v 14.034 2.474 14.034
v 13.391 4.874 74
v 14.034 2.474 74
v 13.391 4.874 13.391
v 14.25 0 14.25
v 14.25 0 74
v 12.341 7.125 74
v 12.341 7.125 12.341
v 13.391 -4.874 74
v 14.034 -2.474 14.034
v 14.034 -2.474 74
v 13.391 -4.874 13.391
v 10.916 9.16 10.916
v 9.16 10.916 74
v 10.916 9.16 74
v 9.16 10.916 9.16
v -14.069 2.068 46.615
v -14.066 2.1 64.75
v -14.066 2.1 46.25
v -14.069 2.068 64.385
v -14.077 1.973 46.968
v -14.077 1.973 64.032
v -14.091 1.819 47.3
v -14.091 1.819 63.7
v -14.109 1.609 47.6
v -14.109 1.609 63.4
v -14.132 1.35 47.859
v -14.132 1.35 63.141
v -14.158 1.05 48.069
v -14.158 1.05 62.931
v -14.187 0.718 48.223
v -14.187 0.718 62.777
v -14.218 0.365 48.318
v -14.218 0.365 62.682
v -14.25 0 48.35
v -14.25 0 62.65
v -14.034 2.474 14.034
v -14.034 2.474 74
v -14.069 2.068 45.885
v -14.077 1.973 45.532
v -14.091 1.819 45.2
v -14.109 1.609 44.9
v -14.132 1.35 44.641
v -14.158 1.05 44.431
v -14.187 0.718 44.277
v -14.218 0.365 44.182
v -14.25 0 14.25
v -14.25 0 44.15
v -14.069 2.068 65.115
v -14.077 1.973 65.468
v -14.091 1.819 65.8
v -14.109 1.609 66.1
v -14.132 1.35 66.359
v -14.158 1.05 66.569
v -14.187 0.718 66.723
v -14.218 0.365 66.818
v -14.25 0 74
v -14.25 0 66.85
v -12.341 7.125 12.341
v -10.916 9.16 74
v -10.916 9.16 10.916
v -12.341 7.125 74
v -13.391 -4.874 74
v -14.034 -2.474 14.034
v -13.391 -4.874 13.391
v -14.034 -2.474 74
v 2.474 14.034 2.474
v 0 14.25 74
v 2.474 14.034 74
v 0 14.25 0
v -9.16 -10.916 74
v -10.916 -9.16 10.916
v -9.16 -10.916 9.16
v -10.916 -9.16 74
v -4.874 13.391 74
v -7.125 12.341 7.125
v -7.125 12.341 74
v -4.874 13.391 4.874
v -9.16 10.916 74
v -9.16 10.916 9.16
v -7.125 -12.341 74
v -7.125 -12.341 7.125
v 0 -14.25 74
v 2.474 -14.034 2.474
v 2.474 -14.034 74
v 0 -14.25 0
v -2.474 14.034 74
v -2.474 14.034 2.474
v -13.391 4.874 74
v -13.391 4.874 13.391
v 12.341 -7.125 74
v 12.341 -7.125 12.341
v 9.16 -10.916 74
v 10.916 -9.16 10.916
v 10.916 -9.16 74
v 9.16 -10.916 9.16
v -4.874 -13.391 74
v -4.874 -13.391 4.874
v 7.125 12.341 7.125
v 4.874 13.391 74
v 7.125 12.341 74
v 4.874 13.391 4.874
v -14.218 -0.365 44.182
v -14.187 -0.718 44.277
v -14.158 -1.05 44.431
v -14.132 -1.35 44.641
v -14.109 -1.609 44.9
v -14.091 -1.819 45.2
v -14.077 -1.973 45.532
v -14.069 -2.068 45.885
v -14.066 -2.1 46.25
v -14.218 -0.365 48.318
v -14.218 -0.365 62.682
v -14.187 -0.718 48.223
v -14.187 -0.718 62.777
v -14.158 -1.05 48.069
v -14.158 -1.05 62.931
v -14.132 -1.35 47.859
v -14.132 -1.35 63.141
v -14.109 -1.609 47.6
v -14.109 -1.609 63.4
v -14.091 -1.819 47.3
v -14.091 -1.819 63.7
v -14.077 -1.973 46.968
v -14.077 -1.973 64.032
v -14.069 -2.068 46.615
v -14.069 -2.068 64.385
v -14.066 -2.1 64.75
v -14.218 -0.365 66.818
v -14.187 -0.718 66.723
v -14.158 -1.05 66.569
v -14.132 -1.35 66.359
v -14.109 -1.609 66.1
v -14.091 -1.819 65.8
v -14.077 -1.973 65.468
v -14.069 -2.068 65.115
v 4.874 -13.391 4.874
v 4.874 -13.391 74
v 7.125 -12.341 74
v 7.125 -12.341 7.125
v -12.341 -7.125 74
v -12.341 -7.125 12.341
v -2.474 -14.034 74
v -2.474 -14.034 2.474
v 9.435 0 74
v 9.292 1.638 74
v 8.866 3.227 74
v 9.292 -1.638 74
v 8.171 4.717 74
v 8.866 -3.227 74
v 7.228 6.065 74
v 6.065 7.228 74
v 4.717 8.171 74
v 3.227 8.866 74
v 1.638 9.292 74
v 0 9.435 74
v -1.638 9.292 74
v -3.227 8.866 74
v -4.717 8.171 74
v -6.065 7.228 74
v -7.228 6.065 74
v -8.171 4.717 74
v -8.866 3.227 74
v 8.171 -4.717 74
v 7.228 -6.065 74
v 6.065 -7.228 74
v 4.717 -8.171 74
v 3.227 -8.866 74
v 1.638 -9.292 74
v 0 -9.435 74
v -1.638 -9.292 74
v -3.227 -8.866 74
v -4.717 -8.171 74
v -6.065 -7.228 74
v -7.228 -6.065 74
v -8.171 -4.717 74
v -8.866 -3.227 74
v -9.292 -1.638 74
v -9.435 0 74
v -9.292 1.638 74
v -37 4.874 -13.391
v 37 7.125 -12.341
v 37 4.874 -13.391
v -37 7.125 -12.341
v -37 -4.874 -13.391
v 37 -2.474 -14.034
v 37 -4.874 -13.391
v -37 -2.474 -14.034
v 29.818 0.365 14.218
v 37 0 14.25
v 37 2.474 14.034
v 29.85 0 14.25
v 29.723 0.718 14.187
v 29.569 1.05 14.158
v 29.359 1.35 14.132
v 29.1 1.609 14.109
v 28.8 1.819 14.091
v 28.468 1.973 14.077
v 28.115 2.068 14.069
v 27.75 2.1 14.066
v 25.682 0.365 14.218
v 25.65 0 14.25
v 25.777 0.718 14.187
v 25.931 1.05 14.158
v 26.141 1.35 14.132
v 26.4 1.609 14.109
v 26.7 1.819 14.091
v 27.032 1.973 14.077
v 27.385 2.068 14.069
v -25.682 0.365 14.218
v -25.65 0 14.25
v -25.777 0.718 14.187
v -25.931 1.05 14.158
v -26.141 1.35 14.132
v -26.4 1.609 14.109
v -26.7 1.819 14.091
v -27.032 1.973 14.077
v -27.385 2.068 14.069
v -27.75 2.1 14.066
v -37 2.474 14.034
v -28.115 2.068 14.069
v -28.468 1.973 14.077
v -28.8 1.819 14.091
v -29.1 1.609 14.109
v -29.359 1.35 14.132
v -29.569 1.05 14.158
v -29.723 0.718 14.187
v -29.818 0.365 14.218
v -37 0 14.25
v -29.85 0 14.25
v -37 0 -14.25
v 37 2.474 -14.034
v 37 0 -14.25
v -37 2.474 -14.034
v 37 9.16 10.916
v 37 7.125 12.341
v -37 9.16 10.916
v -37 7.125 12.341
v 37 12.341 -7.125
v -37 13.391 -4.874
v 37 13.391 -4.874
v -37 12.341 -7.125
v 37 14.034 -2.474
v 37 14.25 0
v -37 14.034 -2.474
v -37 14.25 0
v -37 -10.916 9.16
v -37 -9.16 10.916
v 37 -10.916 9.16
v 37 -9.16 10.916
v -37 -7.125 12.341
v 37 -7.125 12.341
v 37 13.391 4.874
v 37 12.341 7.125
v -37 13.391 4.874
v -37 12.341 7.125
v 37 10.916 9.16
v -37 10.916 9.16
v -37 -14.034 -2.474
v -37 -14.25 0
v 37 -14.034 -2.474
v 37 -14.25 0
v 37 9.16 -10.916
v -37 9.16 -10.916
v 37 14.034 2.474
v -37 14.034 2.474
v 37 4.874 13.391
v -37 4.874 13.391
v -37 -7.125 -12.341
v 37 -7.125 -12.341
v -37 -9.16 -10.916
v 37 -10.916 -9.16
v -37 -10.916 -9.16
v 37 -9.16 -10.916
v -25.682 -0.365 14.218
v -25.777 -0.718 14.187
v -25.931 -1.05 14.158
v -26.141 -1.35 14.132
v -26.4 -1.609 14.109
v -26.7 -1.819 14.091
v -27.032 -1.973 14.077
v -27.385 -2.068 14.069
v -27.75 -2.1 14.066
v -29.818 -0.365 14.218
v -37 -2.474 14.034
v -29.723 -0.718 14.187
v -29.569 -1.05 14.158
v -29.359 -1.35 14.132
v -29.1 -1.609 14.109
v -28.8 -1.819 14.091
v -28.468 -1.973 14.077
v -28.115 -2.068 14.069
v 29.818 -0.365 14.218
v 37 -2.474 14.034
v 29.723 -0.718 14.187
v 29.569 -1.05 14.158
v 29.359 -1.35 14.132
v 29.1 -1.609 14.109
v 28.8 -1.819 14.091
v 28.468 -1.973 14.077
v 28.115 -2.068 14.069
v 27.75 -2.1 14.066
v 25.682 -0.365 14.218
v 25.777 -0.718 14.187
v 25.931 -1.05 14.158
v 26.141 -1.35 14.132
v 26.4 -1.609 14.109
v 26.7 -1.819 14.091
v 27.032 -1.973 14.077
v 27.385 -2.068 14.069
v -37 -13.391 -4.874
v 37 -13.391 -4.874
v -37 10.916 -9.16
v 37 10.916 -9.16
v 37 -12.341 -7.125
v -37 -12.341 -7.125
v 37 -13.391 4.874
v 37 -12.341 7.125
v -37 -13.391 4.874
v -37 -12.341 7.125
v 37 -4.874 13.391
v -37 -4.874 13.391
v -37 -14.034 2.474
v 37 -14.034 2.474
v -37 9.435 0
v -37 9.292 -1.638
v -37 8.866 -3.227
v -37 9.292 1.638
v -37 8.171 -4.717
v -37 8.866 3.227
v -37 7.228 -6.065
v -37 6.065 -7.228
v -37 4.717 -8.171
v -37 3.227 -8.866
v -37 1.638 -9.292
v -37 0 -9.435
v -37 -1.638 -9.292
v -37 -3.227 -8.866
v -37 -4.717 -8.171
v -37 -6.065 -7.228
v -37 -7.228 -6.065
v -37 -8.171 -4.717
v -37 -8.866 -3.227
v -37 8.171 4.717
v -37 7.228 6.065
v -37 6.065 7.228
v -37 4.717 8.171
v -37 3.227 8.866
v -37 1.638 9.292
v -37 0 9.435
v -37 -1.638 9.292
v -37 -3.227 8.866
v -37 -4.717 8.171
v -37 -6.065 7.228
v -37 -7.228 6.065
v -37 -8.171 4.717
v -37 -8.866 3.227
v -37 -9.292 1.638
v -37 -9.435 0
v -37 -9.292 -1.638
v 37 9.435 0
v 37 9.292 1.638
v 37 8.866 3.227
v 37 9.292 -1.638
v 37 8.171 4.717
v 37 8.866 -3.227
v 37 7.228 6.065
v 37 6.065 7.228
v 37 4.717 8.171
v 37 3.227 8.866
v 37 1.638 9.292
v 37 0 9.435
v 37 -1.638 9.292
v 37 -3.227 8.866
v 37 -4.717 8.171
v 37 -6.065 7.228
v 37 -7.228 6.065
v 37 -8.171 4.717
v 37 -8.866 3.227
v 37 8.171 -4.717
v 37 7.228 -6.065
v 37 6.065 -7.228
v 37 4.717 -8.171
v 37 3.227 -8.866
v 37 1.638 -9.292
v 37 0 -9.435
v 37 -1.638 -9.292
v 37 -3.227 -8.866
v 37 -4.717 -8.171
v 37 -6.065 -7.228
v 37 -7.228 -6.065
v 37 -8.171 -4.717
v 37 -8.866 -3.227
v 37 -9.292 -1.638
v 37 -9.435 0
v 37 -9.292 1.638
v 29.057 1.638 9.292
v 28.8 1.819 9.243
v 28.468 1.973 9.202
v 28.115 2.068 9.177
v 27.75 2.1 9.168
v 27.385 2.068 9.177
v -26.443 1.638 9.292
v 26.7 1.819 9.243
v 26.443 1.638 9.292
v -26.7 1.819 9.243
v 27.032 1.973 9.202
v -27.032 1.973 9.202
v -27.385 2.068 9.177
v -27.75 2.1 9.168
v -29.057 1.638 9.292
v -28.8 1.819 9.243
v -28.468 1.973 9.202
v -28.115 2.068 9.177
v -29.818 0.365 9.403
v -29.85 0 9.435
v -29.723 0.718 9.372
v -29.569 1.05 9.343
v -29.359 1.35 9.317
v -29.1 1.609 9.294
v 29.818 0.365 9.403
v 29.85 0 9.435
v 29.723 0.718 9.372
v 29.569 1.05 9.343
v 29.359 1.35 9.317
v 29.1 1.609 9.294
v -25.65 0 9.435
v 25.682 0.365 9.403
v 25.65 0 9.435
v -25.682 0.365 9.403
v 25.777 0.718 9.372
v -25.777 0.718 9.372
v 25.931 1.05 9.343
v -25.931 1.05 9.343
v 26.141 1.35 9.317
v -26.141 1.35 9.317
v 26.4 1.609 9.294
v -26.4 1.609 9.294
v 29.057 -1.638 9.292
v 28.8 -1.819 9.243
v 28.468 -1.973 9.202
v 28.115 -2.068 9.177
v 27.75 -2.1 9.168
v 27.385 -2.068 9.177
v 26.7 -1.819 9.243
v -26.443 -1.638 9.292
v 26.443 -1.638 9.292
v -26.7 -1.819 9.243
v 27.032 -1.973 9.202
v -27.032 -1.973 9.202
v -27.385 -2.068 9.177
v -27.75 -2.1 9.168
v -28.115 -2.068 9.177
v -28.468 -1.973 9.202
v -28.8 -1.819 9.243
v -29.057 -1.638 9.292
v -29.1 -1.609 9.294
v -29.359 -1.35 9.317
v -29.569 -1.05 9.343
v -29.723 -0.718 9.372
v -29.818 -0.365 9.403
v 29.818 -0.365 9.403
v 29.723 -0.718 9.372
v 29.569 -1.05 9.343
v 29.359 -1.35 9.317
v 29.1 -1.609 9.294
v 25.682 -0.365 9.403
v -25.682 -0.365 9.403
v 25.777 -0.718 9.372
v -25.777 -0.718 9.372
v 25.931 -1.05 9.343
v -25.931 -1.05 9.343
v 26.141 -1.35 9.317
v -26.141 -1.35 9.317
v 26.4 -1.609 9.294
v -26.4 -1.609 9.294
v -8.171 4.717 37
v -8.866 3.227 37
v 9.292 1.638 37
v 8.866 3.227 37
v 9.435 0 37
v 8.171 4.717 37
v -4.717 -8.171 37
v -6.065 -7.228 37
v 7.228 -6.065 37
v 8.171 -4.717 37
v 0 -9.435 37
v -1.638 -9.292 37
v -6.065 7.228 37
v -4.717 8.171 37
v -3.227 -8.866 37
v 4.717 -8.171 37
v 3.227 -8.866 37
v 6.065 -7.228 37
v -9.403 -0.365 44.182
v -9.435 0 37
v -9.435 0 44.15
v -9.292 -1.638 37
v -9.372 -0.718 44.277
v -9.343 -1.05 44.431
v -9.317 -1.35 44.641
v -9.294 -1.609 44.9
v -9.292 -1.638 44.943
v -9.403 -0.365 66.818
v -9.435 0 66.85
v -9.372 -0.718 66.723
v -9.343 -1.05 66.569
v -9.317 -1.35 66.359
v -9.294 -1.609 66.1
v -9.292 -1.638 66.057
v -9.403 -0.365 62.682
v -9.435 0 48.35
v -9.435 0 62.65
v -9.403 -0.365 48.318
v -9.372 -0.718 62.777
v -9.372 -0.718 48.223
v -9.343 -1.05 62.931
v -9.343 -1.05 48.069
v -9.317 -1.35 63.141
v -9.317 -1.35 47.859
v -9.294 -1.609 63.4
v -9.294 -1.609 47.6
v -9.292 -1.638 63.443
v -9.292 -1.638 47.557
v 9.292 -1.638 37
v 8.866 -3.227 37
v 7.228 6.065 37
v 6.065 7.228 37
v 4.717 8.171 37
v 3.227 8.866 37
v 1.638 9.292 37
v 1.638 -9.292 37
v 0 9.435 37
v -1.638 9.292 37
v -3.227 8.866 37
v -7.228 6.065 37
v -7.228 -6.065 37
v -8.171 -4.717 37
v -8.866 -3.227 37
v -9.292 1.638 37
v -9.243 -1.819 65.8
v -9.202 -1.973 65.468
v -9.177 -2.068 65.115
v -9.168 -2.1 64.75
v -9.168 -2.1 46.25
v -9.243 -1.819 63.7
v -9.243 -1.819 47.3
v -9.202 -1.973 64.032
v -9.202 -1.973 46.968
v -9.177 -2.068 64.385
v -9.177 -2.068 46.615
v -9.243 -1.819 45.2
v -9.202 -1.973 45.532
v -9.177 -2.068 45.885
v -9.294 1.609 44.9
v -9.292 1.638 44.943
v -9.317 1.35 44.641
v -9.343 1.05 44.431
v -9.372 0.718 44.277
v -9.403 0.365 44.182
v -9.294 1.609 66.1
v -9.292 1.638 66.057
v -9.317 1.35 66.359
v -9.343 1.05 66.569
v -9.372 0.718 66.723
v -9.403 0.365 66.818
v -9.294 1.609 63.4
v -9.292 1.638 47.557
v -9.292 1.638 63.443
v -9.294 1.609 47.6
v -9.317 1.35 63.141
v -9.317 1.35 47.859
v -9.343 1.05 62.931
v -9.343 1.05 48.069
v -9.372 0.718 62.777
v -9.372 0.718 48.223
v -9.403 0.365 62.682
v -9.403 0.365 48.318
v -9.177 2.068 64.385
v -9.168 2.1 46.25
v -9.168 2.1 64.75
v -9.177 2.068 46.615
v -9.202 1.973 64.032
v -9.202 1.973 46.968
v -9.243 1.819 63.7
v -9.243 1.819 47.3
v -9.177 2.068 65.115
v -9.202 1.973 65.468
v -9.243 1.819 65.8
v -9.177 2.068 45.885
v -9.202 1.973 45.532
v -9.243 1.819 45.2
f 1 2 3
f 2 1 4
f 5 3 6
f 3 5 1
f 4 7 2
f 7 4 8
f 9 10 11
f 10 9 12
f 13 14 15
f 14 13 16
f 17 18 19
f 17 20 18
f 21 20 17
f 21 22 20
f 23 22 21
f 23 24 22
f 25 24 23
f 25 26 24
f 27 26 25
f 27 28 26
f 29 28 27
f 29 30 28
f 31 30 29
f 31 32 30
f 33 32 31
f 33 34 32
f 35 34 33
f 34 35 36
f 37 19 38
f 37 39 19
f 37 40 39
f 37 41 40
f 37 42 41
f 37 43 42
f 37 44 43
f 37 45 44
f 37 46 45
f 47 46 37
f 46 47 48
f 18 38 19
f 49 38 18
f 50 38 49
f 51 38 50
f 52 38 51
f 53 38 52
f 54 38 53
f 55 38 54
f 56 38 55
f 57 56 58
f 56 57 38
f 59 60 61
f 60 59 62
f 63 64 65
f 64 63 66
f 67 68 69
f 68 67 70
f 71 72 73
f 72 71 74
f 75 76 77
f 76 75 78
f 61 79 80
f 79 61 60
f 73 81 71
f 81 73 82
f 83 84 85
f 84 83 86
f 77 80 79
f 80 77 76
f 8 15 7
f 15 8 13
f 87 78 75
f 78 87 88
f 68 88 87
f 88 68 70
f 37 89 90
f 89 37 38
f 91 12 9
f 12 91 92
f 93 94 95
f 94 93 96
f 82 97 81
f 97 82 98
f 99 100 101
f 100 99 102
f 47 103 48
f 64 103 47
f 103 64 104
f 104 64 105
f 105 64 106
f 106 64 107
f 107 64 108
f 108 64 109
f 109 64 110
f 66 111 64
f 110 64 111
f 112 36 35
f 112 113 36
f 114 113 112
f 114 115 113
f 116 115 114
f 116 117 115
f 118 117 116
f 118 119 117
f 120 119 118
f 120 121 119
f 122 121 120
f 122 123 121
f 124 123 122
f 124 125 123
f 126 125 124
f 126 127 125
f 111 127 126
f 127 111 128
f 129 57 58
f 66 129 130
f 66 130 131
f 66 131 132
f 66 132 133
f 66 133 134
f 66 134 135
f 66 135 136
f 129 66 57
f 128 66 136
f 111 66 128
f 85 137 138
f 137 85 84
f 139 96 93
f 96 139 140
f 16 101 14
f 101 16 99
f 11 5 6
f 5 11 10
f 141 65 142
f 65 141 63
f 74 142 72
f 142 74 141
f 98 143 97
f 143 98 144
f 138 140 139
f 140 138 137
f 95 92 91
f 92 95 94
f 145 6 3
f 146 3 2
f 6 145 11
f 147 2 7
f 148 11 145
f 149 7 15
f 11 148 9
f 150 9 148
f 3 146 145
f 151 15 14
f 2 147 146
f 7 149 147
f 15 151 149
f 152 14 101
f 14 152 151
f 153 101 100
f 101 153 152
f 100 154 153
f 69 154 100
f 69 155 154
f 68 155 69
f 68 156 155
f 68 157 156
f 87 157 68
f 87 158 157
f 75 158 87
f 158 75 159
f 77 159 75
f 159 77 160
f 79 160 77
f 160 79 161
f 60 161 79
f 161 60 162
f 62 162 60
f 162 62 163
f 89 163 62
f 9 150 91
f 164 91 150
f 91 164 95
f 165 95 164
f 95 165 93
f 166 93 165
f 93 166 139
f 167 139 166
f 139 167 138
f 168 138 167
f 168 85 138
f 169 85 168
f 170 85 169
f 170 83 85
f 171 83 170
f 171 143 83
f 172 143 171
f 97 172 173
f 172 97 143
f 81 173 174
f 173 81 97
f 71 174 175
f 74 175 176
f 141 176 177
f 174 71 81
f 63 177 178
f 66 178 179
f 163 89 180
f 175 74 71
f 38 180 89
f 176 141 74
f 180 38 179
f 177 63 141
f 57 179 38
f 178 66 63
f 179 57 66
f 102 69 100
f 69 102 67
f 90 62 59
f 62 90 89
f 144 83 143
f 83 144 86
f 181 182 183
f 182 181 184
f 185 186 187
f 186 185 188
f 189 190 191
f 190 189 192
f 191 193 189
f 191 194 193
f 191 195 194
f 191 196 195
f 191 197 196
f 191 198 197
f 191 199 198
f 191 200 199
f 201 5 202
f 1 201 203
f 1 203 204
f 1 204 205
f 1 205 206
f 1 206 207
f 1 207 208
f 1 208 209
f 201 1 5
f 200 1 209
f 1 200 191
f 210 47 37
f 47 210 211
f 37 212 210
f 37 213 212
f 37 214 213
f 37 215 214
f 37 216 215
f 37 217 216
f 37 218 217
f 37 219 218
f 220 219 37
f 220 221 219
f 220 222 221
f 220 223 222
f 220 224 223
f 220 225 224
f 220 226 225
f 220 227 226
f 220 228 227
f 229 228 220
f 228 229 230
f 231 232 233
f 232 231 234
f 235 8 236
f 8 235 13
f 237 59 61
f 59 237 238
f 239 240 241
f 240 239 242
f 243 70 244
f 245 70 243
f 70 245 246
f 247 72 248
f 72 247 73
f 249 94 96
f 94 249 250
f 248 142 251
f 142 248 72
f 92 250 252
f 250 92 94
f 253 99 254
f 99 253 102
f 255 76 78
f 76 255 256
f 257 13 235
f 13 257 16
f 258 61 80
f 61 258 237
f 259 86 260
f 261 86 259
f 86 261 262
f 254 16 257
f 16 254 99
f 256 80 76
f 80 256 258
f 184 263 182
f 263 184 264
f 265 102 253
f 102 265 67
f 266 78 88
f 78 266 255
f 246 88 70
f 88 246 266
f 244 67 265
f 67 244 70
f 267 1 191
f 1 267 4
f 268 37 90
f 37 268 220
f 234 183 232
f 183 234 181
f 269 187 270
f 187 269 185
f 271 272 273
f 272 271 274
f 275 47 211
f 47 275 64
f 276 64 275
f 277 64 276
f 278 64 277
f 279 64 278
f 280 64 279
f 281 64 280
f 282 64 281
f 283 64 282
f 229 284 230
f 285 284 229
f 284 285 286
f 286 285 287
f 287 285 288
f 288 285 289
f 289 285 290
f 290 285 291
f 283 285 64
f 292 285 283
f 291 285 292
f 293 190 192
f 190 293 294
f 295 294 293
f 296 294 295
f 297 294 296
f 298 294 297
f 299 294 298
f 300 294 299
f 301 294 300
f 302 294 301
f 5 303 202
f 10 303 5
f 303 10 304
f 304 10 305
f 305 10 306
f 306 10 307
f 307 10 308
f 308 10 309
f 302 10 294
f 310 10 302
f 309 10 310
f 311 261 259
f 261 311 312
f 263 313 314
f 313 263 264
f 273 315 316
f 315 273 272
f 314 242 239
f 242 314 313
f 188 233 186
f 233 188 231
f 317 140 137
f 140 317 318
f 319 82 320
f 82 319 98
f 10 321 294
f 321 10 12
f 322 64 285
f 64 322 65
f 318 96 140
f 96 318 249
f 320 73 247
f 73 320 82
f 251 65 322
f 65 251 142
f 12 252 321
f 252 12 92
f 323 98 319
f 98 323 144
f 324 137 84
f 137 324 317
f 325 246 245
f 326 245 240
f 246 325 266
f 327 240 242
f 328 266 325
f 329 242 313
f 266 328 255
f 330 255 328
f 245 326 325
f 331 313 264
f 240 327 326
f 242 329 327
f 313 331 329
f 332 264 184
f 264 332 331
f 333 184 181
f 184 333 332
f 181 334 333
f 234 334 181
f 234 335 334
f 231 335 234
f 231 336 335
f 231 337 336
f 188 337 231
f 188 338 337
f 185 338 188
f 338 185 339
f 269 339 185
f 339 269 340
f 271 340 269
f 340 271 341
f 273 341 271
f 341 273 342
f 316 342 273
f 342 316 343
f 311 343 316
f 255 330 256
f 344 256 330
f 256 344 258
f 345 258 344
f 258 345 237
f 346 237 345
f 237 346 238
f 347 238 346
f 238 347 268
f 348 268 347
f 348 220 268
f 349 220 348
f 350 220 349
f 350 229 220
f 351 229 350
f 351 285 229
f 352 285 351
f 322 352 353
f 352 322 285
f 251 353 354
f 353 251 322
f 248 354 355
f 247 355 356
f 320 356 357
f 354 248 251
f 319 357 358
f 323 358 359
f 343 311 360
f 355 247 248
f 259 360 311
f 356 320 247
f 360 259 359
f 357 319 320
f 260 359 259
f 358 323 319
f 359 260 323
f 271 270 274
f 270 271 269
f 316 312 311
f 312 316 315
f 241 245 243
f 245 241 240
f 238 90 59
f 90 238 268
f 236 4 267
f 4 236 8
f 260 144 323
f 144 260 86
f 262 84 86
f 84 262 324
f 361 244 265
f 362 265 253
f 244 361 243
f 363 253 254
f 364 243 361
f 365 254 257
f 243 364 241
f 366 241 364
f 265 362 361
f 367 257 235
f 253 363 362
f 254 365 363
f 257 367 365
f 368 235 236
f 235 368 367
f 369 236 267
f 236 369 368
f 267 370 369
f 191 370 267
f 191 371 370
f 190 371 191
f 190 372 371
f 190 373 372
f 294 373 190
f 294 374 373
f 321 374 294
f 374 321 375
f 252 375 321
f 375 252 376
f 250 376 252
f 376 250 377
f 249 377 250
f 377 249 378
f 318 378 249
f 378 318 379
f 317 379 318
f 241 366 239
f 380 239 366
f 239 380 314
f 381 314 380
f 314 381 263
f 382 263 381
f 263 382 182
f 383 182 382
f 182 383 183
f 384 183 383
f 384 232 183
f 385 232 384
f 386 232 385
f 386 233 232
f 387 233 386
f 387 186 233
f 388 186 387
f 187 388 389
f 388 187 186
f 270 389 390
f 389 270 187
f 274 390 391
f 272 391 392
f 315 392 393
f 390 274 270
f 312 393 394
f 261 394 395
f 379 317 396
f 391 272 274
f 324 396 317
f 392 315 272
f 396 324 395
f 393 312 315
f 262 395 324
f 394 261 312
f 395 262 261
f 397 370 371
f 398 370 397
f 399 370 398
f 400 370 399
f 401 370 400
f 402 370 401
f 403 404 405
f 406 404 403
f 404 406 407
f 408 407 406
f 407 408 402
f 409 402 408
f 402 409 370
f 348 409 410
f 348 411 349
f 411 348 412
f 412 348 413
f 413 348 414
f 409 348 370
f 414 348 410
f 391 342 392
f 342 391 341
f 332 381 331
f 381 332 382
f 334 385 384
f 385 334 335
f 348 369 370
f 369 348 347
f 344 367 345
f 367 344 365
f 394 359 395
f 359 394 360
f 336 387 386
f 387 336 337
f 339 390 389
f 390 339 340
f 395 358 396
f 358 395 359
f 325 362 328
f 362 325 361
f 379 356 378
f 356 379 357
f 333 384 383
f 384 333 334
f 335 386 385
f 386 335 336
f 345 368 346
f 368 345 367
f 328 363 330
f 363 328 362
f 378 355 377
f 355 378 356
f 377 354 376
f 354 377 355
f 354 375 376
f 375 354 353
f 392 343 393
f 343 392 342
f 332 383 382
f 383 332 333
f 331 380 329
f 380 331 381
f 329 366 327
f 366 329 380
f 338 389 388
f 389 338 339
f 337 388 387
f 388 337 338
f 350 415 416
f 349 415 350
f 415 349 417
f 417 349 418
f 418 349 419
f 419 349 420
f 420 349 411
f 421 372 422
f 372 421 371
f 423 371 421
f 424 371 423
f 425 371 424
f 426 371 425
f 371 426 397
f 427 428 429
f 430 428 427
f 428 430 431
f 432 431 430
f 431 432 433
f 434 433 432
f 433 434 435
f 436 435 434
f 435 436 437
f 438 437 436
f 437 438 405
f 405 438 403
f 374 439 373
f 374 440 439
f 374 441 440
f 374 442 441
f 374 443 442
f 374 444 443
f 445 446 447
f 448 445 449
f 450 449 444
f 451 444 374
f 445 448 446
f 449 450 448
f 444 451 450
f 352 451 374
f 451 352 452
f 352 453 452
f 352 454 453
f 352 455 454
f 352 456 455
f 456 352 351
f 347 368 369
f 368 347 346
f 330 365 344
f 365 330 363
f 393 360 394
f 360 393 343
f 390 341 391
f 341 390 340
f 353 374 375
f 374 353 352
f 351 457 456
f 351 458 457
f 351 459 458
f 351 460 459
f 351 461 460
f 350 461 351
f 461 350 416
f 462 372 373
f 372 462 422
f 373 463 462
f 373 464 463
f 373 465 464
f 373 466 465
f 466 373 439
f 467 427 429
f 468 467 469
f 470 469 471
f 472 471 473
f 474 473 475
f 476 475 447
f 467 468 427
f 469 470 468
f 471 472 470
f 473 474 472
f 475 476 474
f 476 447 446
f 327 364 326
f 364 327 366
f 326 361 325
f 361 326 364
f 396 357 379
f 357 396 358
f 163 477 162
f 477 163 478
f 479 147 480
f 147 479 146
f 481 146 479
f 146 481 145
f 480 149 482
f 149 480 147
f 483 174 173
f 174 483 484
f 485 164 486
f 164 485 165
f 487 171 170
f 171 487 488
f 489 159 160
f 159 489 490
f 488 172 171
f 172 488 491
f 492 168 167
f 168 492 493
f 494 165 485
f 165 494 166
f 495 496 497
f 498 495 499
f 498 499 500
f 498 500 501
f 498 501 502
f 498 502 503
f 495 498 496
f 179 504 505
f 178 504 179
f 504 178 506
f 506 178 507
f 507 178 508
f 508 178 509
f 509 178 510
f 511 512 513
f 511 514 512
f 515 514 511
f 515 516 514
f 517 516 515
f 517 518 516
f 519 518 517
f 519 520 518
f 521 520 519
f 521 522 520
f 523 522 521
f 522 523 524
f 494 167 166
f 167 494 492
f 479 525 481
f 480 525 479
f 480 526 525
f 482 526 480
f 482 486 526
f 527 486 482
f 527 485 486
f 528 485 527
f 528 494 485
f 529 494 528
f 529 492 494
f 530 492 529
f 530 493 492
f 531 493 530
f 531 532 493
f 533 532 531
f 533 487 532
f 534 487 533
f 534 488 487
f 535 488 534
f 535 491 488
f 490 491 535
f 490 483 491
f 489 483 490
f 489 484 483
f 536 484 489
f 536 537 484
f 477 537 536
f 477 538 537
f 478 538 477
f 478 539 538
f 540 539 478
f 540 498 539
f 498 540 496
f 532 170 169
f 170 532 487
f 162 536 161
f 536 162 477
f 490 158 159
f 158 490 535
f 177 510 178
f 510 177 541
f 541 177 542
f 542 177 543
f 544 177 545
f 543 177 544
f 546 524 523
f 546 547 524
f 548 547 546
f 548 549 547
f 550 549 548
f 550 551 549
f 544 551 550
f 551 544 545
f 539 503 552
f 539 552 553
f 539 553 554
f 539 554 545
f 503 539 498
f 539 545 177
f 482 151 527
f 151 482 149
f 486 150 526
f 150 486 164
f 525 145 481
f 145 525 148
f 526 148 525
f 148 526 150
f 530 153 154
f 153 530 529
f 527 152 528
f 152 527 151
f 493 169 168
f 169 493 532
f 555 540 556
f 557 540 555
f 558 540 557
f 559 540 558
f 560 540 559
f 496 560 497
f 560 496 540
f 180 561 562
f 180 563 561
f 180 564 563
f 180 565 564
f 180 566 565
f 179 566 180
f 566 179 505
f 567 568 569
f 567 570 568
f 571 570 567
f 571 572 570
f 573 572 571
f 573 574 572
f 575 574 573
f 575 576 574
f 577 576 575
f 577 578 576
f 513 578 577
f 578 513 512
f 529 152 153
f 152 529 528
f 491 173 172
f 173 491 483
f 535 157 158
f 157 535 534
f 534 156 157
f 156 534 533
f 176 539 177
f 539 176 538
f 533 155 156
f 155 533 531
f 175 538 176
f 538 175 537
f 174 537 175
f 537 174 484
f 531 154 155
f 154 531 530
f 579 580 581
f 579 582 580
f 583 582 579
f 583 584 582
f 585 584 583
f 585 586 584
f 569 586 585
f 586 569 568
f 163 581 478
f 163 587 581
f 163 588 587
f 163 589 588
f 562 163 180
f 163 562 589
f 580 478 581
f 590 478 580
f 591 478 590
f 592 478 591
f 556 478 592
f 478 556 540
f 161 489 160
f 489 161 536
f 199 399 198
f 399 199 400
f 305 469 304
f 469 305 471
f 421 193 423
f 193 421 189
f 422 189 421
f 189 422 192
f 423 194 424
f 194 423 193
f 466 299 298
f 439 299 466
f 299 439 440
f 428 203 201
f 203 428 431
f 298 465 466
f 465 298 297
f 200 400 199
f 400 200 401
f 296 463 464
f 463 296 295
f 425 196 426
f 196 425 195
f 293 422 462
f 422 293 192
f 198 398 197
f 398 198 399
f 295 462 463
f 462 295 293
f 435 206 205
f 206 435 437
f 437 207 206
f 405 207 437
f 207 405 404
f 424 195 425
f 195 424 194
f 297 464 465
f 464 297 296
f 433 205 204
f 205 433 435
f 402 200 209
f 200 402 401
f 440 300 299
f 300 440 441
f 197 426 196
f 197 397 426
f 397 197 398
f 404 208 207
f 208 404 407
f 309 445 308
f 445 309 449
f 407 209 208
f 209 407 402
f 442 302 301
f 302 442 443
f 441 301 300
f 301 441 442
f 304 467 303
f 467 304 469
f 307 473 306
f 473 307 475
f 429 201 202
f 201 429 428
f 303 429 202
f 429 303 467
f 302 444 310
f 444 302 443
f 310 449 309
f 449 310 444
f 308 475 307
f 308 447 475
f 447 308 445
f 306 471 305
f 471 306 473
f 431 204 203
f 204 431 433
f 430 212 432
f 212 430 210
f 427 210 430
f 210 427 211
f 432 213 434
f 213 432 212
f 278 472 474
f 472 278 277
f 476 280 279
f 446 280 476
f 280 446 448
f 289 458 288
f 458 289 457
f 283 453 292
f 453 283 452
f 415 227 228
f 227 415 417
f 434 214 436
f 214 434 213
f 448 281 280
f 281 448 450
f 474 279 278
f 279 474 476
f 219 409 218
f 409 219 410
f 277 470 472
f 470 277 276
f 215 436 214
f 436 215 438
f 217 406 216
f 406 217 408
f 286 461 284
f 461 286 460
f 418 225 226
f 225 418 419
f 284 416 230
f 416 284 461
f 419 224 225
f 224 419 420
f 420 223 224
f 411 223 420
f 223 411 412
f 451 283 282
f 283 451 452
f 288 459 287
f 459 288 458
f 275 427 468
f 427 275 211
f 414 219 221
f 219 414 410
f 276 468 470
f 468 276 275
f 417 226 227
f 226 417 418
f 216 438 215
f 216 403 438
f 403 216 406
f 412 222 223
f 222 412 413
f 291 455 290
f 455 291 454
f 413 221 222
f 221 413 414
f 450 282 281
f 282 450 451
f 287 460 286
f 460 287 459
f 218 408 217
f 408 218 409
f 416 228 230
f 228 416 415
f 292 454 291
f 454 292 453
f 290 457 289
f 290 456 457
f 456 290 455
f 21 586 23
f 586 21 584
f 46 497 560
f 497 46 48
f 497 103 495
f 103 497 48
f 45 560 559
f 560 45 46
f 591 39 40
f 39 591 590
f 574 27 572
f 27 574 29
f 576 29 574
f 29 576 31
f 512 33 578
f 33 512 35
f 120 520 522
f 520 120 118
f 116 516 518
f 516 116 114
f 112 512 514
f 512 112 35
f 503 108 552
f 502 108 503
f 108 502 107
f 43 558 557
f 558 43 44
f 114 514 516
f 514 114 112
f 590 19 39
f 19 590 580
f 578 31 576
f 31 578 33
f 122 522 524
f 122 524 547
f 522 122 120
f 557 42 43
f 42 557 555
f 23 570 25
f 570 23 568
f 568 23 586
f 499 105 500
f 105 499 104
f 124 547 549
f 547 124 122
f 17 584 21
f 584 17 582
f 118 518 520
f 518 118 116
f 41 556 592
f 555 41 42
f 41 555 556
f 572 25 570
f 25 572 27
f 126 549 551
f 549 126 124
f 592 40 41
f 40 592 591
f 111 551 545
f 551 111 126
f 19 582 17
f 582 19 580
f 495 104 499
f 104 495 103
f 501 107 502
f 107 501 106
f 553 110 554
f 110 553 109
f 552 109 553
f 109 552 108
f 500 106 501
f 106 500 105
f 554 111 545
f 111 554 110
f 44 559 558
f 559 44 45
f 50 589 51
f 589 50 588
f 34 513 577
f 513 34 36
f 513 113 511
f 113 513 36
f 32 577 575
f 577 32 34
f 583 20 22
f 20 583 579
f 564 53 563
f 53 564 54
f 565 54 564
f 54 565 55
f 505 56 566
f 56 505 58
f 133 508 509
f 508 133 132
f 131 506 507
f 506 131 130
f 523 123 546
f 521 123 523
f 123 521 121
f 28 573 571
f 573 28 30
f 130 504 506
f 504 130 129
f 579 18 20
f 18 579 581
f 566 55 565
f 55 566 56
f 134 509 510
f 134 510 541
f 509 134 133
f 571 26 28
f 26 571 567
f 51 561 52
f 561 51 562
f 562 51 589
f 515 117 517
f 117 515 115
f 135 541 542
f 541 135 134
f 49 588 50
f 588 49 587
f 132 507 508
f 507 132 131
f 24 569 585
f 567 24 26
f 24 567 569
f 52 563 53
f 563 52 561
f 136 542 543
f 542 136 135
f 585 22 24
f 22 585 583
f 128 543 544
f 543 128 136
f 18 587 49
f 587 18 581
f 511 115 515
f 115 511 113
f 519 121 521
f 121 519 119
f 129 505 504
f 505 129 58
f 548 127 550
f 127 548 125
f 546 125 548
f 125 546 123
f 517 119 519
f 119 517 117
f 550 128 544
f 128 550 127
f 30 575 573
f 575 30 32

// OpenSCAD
/* [Body] */
Shell_Thickness = 5;

/* [Conduit] */
Conduit_Diameter = 18.5;
Printer_Fudge = 1.02;

/* [Hardware] */ 
Screw_thread = 3;
Heatset_Diameter = 4.2;

/* [Hidden] */
$fn=36;

difference() {
    union(){
        cylinder(h = Conduit_Diameter*4, d=Conduit_Diameter+(Shell_Thickness*2));
        rotate([0,90,0])cylinder(h = Conduit_Diameter*4, d=Conduit_Diameter+(Shell_Thickness*2),center = true);
    }
    rotate([0,90,0])cylinder(h = Conduit_Diameter*4+.02, d=Conduit_Diameter*Printer_Fudge,center = true);
    translate([0,0,2*Conduit_Diameter])cylinder(h = Conduit_Diameter*2+0.01, d=Conduit_Diameter*Printer_Fudge);
    #translate([Conduit_Diameter*1.5,0,Conduit_Diameter/2-1]) cylinder(h = Shell_Thickness+2, d=Heatset_Diameter);
    #translate([-Conduit_Diameter*1.5,0,Conduit_Diameter/2-1]) cylinder(h = Shell_Thickness+2, d=Heatset_Diameter);
    translate([-(Conduit_Diameter/2-1),0,Conduit_Diameter*2.5])#rotate([0,-90,0]) cylinder(h = Shell_Thickness+2, d=Heatset_Diameter); 
    translate([-(Conduit_Diameter/2-1),0,Conduit_Diameter*3.5])#rotate([0,-90,0]) cylinder(h = Shell_Thickness+2, d=Heatset_Diameter); 
}
